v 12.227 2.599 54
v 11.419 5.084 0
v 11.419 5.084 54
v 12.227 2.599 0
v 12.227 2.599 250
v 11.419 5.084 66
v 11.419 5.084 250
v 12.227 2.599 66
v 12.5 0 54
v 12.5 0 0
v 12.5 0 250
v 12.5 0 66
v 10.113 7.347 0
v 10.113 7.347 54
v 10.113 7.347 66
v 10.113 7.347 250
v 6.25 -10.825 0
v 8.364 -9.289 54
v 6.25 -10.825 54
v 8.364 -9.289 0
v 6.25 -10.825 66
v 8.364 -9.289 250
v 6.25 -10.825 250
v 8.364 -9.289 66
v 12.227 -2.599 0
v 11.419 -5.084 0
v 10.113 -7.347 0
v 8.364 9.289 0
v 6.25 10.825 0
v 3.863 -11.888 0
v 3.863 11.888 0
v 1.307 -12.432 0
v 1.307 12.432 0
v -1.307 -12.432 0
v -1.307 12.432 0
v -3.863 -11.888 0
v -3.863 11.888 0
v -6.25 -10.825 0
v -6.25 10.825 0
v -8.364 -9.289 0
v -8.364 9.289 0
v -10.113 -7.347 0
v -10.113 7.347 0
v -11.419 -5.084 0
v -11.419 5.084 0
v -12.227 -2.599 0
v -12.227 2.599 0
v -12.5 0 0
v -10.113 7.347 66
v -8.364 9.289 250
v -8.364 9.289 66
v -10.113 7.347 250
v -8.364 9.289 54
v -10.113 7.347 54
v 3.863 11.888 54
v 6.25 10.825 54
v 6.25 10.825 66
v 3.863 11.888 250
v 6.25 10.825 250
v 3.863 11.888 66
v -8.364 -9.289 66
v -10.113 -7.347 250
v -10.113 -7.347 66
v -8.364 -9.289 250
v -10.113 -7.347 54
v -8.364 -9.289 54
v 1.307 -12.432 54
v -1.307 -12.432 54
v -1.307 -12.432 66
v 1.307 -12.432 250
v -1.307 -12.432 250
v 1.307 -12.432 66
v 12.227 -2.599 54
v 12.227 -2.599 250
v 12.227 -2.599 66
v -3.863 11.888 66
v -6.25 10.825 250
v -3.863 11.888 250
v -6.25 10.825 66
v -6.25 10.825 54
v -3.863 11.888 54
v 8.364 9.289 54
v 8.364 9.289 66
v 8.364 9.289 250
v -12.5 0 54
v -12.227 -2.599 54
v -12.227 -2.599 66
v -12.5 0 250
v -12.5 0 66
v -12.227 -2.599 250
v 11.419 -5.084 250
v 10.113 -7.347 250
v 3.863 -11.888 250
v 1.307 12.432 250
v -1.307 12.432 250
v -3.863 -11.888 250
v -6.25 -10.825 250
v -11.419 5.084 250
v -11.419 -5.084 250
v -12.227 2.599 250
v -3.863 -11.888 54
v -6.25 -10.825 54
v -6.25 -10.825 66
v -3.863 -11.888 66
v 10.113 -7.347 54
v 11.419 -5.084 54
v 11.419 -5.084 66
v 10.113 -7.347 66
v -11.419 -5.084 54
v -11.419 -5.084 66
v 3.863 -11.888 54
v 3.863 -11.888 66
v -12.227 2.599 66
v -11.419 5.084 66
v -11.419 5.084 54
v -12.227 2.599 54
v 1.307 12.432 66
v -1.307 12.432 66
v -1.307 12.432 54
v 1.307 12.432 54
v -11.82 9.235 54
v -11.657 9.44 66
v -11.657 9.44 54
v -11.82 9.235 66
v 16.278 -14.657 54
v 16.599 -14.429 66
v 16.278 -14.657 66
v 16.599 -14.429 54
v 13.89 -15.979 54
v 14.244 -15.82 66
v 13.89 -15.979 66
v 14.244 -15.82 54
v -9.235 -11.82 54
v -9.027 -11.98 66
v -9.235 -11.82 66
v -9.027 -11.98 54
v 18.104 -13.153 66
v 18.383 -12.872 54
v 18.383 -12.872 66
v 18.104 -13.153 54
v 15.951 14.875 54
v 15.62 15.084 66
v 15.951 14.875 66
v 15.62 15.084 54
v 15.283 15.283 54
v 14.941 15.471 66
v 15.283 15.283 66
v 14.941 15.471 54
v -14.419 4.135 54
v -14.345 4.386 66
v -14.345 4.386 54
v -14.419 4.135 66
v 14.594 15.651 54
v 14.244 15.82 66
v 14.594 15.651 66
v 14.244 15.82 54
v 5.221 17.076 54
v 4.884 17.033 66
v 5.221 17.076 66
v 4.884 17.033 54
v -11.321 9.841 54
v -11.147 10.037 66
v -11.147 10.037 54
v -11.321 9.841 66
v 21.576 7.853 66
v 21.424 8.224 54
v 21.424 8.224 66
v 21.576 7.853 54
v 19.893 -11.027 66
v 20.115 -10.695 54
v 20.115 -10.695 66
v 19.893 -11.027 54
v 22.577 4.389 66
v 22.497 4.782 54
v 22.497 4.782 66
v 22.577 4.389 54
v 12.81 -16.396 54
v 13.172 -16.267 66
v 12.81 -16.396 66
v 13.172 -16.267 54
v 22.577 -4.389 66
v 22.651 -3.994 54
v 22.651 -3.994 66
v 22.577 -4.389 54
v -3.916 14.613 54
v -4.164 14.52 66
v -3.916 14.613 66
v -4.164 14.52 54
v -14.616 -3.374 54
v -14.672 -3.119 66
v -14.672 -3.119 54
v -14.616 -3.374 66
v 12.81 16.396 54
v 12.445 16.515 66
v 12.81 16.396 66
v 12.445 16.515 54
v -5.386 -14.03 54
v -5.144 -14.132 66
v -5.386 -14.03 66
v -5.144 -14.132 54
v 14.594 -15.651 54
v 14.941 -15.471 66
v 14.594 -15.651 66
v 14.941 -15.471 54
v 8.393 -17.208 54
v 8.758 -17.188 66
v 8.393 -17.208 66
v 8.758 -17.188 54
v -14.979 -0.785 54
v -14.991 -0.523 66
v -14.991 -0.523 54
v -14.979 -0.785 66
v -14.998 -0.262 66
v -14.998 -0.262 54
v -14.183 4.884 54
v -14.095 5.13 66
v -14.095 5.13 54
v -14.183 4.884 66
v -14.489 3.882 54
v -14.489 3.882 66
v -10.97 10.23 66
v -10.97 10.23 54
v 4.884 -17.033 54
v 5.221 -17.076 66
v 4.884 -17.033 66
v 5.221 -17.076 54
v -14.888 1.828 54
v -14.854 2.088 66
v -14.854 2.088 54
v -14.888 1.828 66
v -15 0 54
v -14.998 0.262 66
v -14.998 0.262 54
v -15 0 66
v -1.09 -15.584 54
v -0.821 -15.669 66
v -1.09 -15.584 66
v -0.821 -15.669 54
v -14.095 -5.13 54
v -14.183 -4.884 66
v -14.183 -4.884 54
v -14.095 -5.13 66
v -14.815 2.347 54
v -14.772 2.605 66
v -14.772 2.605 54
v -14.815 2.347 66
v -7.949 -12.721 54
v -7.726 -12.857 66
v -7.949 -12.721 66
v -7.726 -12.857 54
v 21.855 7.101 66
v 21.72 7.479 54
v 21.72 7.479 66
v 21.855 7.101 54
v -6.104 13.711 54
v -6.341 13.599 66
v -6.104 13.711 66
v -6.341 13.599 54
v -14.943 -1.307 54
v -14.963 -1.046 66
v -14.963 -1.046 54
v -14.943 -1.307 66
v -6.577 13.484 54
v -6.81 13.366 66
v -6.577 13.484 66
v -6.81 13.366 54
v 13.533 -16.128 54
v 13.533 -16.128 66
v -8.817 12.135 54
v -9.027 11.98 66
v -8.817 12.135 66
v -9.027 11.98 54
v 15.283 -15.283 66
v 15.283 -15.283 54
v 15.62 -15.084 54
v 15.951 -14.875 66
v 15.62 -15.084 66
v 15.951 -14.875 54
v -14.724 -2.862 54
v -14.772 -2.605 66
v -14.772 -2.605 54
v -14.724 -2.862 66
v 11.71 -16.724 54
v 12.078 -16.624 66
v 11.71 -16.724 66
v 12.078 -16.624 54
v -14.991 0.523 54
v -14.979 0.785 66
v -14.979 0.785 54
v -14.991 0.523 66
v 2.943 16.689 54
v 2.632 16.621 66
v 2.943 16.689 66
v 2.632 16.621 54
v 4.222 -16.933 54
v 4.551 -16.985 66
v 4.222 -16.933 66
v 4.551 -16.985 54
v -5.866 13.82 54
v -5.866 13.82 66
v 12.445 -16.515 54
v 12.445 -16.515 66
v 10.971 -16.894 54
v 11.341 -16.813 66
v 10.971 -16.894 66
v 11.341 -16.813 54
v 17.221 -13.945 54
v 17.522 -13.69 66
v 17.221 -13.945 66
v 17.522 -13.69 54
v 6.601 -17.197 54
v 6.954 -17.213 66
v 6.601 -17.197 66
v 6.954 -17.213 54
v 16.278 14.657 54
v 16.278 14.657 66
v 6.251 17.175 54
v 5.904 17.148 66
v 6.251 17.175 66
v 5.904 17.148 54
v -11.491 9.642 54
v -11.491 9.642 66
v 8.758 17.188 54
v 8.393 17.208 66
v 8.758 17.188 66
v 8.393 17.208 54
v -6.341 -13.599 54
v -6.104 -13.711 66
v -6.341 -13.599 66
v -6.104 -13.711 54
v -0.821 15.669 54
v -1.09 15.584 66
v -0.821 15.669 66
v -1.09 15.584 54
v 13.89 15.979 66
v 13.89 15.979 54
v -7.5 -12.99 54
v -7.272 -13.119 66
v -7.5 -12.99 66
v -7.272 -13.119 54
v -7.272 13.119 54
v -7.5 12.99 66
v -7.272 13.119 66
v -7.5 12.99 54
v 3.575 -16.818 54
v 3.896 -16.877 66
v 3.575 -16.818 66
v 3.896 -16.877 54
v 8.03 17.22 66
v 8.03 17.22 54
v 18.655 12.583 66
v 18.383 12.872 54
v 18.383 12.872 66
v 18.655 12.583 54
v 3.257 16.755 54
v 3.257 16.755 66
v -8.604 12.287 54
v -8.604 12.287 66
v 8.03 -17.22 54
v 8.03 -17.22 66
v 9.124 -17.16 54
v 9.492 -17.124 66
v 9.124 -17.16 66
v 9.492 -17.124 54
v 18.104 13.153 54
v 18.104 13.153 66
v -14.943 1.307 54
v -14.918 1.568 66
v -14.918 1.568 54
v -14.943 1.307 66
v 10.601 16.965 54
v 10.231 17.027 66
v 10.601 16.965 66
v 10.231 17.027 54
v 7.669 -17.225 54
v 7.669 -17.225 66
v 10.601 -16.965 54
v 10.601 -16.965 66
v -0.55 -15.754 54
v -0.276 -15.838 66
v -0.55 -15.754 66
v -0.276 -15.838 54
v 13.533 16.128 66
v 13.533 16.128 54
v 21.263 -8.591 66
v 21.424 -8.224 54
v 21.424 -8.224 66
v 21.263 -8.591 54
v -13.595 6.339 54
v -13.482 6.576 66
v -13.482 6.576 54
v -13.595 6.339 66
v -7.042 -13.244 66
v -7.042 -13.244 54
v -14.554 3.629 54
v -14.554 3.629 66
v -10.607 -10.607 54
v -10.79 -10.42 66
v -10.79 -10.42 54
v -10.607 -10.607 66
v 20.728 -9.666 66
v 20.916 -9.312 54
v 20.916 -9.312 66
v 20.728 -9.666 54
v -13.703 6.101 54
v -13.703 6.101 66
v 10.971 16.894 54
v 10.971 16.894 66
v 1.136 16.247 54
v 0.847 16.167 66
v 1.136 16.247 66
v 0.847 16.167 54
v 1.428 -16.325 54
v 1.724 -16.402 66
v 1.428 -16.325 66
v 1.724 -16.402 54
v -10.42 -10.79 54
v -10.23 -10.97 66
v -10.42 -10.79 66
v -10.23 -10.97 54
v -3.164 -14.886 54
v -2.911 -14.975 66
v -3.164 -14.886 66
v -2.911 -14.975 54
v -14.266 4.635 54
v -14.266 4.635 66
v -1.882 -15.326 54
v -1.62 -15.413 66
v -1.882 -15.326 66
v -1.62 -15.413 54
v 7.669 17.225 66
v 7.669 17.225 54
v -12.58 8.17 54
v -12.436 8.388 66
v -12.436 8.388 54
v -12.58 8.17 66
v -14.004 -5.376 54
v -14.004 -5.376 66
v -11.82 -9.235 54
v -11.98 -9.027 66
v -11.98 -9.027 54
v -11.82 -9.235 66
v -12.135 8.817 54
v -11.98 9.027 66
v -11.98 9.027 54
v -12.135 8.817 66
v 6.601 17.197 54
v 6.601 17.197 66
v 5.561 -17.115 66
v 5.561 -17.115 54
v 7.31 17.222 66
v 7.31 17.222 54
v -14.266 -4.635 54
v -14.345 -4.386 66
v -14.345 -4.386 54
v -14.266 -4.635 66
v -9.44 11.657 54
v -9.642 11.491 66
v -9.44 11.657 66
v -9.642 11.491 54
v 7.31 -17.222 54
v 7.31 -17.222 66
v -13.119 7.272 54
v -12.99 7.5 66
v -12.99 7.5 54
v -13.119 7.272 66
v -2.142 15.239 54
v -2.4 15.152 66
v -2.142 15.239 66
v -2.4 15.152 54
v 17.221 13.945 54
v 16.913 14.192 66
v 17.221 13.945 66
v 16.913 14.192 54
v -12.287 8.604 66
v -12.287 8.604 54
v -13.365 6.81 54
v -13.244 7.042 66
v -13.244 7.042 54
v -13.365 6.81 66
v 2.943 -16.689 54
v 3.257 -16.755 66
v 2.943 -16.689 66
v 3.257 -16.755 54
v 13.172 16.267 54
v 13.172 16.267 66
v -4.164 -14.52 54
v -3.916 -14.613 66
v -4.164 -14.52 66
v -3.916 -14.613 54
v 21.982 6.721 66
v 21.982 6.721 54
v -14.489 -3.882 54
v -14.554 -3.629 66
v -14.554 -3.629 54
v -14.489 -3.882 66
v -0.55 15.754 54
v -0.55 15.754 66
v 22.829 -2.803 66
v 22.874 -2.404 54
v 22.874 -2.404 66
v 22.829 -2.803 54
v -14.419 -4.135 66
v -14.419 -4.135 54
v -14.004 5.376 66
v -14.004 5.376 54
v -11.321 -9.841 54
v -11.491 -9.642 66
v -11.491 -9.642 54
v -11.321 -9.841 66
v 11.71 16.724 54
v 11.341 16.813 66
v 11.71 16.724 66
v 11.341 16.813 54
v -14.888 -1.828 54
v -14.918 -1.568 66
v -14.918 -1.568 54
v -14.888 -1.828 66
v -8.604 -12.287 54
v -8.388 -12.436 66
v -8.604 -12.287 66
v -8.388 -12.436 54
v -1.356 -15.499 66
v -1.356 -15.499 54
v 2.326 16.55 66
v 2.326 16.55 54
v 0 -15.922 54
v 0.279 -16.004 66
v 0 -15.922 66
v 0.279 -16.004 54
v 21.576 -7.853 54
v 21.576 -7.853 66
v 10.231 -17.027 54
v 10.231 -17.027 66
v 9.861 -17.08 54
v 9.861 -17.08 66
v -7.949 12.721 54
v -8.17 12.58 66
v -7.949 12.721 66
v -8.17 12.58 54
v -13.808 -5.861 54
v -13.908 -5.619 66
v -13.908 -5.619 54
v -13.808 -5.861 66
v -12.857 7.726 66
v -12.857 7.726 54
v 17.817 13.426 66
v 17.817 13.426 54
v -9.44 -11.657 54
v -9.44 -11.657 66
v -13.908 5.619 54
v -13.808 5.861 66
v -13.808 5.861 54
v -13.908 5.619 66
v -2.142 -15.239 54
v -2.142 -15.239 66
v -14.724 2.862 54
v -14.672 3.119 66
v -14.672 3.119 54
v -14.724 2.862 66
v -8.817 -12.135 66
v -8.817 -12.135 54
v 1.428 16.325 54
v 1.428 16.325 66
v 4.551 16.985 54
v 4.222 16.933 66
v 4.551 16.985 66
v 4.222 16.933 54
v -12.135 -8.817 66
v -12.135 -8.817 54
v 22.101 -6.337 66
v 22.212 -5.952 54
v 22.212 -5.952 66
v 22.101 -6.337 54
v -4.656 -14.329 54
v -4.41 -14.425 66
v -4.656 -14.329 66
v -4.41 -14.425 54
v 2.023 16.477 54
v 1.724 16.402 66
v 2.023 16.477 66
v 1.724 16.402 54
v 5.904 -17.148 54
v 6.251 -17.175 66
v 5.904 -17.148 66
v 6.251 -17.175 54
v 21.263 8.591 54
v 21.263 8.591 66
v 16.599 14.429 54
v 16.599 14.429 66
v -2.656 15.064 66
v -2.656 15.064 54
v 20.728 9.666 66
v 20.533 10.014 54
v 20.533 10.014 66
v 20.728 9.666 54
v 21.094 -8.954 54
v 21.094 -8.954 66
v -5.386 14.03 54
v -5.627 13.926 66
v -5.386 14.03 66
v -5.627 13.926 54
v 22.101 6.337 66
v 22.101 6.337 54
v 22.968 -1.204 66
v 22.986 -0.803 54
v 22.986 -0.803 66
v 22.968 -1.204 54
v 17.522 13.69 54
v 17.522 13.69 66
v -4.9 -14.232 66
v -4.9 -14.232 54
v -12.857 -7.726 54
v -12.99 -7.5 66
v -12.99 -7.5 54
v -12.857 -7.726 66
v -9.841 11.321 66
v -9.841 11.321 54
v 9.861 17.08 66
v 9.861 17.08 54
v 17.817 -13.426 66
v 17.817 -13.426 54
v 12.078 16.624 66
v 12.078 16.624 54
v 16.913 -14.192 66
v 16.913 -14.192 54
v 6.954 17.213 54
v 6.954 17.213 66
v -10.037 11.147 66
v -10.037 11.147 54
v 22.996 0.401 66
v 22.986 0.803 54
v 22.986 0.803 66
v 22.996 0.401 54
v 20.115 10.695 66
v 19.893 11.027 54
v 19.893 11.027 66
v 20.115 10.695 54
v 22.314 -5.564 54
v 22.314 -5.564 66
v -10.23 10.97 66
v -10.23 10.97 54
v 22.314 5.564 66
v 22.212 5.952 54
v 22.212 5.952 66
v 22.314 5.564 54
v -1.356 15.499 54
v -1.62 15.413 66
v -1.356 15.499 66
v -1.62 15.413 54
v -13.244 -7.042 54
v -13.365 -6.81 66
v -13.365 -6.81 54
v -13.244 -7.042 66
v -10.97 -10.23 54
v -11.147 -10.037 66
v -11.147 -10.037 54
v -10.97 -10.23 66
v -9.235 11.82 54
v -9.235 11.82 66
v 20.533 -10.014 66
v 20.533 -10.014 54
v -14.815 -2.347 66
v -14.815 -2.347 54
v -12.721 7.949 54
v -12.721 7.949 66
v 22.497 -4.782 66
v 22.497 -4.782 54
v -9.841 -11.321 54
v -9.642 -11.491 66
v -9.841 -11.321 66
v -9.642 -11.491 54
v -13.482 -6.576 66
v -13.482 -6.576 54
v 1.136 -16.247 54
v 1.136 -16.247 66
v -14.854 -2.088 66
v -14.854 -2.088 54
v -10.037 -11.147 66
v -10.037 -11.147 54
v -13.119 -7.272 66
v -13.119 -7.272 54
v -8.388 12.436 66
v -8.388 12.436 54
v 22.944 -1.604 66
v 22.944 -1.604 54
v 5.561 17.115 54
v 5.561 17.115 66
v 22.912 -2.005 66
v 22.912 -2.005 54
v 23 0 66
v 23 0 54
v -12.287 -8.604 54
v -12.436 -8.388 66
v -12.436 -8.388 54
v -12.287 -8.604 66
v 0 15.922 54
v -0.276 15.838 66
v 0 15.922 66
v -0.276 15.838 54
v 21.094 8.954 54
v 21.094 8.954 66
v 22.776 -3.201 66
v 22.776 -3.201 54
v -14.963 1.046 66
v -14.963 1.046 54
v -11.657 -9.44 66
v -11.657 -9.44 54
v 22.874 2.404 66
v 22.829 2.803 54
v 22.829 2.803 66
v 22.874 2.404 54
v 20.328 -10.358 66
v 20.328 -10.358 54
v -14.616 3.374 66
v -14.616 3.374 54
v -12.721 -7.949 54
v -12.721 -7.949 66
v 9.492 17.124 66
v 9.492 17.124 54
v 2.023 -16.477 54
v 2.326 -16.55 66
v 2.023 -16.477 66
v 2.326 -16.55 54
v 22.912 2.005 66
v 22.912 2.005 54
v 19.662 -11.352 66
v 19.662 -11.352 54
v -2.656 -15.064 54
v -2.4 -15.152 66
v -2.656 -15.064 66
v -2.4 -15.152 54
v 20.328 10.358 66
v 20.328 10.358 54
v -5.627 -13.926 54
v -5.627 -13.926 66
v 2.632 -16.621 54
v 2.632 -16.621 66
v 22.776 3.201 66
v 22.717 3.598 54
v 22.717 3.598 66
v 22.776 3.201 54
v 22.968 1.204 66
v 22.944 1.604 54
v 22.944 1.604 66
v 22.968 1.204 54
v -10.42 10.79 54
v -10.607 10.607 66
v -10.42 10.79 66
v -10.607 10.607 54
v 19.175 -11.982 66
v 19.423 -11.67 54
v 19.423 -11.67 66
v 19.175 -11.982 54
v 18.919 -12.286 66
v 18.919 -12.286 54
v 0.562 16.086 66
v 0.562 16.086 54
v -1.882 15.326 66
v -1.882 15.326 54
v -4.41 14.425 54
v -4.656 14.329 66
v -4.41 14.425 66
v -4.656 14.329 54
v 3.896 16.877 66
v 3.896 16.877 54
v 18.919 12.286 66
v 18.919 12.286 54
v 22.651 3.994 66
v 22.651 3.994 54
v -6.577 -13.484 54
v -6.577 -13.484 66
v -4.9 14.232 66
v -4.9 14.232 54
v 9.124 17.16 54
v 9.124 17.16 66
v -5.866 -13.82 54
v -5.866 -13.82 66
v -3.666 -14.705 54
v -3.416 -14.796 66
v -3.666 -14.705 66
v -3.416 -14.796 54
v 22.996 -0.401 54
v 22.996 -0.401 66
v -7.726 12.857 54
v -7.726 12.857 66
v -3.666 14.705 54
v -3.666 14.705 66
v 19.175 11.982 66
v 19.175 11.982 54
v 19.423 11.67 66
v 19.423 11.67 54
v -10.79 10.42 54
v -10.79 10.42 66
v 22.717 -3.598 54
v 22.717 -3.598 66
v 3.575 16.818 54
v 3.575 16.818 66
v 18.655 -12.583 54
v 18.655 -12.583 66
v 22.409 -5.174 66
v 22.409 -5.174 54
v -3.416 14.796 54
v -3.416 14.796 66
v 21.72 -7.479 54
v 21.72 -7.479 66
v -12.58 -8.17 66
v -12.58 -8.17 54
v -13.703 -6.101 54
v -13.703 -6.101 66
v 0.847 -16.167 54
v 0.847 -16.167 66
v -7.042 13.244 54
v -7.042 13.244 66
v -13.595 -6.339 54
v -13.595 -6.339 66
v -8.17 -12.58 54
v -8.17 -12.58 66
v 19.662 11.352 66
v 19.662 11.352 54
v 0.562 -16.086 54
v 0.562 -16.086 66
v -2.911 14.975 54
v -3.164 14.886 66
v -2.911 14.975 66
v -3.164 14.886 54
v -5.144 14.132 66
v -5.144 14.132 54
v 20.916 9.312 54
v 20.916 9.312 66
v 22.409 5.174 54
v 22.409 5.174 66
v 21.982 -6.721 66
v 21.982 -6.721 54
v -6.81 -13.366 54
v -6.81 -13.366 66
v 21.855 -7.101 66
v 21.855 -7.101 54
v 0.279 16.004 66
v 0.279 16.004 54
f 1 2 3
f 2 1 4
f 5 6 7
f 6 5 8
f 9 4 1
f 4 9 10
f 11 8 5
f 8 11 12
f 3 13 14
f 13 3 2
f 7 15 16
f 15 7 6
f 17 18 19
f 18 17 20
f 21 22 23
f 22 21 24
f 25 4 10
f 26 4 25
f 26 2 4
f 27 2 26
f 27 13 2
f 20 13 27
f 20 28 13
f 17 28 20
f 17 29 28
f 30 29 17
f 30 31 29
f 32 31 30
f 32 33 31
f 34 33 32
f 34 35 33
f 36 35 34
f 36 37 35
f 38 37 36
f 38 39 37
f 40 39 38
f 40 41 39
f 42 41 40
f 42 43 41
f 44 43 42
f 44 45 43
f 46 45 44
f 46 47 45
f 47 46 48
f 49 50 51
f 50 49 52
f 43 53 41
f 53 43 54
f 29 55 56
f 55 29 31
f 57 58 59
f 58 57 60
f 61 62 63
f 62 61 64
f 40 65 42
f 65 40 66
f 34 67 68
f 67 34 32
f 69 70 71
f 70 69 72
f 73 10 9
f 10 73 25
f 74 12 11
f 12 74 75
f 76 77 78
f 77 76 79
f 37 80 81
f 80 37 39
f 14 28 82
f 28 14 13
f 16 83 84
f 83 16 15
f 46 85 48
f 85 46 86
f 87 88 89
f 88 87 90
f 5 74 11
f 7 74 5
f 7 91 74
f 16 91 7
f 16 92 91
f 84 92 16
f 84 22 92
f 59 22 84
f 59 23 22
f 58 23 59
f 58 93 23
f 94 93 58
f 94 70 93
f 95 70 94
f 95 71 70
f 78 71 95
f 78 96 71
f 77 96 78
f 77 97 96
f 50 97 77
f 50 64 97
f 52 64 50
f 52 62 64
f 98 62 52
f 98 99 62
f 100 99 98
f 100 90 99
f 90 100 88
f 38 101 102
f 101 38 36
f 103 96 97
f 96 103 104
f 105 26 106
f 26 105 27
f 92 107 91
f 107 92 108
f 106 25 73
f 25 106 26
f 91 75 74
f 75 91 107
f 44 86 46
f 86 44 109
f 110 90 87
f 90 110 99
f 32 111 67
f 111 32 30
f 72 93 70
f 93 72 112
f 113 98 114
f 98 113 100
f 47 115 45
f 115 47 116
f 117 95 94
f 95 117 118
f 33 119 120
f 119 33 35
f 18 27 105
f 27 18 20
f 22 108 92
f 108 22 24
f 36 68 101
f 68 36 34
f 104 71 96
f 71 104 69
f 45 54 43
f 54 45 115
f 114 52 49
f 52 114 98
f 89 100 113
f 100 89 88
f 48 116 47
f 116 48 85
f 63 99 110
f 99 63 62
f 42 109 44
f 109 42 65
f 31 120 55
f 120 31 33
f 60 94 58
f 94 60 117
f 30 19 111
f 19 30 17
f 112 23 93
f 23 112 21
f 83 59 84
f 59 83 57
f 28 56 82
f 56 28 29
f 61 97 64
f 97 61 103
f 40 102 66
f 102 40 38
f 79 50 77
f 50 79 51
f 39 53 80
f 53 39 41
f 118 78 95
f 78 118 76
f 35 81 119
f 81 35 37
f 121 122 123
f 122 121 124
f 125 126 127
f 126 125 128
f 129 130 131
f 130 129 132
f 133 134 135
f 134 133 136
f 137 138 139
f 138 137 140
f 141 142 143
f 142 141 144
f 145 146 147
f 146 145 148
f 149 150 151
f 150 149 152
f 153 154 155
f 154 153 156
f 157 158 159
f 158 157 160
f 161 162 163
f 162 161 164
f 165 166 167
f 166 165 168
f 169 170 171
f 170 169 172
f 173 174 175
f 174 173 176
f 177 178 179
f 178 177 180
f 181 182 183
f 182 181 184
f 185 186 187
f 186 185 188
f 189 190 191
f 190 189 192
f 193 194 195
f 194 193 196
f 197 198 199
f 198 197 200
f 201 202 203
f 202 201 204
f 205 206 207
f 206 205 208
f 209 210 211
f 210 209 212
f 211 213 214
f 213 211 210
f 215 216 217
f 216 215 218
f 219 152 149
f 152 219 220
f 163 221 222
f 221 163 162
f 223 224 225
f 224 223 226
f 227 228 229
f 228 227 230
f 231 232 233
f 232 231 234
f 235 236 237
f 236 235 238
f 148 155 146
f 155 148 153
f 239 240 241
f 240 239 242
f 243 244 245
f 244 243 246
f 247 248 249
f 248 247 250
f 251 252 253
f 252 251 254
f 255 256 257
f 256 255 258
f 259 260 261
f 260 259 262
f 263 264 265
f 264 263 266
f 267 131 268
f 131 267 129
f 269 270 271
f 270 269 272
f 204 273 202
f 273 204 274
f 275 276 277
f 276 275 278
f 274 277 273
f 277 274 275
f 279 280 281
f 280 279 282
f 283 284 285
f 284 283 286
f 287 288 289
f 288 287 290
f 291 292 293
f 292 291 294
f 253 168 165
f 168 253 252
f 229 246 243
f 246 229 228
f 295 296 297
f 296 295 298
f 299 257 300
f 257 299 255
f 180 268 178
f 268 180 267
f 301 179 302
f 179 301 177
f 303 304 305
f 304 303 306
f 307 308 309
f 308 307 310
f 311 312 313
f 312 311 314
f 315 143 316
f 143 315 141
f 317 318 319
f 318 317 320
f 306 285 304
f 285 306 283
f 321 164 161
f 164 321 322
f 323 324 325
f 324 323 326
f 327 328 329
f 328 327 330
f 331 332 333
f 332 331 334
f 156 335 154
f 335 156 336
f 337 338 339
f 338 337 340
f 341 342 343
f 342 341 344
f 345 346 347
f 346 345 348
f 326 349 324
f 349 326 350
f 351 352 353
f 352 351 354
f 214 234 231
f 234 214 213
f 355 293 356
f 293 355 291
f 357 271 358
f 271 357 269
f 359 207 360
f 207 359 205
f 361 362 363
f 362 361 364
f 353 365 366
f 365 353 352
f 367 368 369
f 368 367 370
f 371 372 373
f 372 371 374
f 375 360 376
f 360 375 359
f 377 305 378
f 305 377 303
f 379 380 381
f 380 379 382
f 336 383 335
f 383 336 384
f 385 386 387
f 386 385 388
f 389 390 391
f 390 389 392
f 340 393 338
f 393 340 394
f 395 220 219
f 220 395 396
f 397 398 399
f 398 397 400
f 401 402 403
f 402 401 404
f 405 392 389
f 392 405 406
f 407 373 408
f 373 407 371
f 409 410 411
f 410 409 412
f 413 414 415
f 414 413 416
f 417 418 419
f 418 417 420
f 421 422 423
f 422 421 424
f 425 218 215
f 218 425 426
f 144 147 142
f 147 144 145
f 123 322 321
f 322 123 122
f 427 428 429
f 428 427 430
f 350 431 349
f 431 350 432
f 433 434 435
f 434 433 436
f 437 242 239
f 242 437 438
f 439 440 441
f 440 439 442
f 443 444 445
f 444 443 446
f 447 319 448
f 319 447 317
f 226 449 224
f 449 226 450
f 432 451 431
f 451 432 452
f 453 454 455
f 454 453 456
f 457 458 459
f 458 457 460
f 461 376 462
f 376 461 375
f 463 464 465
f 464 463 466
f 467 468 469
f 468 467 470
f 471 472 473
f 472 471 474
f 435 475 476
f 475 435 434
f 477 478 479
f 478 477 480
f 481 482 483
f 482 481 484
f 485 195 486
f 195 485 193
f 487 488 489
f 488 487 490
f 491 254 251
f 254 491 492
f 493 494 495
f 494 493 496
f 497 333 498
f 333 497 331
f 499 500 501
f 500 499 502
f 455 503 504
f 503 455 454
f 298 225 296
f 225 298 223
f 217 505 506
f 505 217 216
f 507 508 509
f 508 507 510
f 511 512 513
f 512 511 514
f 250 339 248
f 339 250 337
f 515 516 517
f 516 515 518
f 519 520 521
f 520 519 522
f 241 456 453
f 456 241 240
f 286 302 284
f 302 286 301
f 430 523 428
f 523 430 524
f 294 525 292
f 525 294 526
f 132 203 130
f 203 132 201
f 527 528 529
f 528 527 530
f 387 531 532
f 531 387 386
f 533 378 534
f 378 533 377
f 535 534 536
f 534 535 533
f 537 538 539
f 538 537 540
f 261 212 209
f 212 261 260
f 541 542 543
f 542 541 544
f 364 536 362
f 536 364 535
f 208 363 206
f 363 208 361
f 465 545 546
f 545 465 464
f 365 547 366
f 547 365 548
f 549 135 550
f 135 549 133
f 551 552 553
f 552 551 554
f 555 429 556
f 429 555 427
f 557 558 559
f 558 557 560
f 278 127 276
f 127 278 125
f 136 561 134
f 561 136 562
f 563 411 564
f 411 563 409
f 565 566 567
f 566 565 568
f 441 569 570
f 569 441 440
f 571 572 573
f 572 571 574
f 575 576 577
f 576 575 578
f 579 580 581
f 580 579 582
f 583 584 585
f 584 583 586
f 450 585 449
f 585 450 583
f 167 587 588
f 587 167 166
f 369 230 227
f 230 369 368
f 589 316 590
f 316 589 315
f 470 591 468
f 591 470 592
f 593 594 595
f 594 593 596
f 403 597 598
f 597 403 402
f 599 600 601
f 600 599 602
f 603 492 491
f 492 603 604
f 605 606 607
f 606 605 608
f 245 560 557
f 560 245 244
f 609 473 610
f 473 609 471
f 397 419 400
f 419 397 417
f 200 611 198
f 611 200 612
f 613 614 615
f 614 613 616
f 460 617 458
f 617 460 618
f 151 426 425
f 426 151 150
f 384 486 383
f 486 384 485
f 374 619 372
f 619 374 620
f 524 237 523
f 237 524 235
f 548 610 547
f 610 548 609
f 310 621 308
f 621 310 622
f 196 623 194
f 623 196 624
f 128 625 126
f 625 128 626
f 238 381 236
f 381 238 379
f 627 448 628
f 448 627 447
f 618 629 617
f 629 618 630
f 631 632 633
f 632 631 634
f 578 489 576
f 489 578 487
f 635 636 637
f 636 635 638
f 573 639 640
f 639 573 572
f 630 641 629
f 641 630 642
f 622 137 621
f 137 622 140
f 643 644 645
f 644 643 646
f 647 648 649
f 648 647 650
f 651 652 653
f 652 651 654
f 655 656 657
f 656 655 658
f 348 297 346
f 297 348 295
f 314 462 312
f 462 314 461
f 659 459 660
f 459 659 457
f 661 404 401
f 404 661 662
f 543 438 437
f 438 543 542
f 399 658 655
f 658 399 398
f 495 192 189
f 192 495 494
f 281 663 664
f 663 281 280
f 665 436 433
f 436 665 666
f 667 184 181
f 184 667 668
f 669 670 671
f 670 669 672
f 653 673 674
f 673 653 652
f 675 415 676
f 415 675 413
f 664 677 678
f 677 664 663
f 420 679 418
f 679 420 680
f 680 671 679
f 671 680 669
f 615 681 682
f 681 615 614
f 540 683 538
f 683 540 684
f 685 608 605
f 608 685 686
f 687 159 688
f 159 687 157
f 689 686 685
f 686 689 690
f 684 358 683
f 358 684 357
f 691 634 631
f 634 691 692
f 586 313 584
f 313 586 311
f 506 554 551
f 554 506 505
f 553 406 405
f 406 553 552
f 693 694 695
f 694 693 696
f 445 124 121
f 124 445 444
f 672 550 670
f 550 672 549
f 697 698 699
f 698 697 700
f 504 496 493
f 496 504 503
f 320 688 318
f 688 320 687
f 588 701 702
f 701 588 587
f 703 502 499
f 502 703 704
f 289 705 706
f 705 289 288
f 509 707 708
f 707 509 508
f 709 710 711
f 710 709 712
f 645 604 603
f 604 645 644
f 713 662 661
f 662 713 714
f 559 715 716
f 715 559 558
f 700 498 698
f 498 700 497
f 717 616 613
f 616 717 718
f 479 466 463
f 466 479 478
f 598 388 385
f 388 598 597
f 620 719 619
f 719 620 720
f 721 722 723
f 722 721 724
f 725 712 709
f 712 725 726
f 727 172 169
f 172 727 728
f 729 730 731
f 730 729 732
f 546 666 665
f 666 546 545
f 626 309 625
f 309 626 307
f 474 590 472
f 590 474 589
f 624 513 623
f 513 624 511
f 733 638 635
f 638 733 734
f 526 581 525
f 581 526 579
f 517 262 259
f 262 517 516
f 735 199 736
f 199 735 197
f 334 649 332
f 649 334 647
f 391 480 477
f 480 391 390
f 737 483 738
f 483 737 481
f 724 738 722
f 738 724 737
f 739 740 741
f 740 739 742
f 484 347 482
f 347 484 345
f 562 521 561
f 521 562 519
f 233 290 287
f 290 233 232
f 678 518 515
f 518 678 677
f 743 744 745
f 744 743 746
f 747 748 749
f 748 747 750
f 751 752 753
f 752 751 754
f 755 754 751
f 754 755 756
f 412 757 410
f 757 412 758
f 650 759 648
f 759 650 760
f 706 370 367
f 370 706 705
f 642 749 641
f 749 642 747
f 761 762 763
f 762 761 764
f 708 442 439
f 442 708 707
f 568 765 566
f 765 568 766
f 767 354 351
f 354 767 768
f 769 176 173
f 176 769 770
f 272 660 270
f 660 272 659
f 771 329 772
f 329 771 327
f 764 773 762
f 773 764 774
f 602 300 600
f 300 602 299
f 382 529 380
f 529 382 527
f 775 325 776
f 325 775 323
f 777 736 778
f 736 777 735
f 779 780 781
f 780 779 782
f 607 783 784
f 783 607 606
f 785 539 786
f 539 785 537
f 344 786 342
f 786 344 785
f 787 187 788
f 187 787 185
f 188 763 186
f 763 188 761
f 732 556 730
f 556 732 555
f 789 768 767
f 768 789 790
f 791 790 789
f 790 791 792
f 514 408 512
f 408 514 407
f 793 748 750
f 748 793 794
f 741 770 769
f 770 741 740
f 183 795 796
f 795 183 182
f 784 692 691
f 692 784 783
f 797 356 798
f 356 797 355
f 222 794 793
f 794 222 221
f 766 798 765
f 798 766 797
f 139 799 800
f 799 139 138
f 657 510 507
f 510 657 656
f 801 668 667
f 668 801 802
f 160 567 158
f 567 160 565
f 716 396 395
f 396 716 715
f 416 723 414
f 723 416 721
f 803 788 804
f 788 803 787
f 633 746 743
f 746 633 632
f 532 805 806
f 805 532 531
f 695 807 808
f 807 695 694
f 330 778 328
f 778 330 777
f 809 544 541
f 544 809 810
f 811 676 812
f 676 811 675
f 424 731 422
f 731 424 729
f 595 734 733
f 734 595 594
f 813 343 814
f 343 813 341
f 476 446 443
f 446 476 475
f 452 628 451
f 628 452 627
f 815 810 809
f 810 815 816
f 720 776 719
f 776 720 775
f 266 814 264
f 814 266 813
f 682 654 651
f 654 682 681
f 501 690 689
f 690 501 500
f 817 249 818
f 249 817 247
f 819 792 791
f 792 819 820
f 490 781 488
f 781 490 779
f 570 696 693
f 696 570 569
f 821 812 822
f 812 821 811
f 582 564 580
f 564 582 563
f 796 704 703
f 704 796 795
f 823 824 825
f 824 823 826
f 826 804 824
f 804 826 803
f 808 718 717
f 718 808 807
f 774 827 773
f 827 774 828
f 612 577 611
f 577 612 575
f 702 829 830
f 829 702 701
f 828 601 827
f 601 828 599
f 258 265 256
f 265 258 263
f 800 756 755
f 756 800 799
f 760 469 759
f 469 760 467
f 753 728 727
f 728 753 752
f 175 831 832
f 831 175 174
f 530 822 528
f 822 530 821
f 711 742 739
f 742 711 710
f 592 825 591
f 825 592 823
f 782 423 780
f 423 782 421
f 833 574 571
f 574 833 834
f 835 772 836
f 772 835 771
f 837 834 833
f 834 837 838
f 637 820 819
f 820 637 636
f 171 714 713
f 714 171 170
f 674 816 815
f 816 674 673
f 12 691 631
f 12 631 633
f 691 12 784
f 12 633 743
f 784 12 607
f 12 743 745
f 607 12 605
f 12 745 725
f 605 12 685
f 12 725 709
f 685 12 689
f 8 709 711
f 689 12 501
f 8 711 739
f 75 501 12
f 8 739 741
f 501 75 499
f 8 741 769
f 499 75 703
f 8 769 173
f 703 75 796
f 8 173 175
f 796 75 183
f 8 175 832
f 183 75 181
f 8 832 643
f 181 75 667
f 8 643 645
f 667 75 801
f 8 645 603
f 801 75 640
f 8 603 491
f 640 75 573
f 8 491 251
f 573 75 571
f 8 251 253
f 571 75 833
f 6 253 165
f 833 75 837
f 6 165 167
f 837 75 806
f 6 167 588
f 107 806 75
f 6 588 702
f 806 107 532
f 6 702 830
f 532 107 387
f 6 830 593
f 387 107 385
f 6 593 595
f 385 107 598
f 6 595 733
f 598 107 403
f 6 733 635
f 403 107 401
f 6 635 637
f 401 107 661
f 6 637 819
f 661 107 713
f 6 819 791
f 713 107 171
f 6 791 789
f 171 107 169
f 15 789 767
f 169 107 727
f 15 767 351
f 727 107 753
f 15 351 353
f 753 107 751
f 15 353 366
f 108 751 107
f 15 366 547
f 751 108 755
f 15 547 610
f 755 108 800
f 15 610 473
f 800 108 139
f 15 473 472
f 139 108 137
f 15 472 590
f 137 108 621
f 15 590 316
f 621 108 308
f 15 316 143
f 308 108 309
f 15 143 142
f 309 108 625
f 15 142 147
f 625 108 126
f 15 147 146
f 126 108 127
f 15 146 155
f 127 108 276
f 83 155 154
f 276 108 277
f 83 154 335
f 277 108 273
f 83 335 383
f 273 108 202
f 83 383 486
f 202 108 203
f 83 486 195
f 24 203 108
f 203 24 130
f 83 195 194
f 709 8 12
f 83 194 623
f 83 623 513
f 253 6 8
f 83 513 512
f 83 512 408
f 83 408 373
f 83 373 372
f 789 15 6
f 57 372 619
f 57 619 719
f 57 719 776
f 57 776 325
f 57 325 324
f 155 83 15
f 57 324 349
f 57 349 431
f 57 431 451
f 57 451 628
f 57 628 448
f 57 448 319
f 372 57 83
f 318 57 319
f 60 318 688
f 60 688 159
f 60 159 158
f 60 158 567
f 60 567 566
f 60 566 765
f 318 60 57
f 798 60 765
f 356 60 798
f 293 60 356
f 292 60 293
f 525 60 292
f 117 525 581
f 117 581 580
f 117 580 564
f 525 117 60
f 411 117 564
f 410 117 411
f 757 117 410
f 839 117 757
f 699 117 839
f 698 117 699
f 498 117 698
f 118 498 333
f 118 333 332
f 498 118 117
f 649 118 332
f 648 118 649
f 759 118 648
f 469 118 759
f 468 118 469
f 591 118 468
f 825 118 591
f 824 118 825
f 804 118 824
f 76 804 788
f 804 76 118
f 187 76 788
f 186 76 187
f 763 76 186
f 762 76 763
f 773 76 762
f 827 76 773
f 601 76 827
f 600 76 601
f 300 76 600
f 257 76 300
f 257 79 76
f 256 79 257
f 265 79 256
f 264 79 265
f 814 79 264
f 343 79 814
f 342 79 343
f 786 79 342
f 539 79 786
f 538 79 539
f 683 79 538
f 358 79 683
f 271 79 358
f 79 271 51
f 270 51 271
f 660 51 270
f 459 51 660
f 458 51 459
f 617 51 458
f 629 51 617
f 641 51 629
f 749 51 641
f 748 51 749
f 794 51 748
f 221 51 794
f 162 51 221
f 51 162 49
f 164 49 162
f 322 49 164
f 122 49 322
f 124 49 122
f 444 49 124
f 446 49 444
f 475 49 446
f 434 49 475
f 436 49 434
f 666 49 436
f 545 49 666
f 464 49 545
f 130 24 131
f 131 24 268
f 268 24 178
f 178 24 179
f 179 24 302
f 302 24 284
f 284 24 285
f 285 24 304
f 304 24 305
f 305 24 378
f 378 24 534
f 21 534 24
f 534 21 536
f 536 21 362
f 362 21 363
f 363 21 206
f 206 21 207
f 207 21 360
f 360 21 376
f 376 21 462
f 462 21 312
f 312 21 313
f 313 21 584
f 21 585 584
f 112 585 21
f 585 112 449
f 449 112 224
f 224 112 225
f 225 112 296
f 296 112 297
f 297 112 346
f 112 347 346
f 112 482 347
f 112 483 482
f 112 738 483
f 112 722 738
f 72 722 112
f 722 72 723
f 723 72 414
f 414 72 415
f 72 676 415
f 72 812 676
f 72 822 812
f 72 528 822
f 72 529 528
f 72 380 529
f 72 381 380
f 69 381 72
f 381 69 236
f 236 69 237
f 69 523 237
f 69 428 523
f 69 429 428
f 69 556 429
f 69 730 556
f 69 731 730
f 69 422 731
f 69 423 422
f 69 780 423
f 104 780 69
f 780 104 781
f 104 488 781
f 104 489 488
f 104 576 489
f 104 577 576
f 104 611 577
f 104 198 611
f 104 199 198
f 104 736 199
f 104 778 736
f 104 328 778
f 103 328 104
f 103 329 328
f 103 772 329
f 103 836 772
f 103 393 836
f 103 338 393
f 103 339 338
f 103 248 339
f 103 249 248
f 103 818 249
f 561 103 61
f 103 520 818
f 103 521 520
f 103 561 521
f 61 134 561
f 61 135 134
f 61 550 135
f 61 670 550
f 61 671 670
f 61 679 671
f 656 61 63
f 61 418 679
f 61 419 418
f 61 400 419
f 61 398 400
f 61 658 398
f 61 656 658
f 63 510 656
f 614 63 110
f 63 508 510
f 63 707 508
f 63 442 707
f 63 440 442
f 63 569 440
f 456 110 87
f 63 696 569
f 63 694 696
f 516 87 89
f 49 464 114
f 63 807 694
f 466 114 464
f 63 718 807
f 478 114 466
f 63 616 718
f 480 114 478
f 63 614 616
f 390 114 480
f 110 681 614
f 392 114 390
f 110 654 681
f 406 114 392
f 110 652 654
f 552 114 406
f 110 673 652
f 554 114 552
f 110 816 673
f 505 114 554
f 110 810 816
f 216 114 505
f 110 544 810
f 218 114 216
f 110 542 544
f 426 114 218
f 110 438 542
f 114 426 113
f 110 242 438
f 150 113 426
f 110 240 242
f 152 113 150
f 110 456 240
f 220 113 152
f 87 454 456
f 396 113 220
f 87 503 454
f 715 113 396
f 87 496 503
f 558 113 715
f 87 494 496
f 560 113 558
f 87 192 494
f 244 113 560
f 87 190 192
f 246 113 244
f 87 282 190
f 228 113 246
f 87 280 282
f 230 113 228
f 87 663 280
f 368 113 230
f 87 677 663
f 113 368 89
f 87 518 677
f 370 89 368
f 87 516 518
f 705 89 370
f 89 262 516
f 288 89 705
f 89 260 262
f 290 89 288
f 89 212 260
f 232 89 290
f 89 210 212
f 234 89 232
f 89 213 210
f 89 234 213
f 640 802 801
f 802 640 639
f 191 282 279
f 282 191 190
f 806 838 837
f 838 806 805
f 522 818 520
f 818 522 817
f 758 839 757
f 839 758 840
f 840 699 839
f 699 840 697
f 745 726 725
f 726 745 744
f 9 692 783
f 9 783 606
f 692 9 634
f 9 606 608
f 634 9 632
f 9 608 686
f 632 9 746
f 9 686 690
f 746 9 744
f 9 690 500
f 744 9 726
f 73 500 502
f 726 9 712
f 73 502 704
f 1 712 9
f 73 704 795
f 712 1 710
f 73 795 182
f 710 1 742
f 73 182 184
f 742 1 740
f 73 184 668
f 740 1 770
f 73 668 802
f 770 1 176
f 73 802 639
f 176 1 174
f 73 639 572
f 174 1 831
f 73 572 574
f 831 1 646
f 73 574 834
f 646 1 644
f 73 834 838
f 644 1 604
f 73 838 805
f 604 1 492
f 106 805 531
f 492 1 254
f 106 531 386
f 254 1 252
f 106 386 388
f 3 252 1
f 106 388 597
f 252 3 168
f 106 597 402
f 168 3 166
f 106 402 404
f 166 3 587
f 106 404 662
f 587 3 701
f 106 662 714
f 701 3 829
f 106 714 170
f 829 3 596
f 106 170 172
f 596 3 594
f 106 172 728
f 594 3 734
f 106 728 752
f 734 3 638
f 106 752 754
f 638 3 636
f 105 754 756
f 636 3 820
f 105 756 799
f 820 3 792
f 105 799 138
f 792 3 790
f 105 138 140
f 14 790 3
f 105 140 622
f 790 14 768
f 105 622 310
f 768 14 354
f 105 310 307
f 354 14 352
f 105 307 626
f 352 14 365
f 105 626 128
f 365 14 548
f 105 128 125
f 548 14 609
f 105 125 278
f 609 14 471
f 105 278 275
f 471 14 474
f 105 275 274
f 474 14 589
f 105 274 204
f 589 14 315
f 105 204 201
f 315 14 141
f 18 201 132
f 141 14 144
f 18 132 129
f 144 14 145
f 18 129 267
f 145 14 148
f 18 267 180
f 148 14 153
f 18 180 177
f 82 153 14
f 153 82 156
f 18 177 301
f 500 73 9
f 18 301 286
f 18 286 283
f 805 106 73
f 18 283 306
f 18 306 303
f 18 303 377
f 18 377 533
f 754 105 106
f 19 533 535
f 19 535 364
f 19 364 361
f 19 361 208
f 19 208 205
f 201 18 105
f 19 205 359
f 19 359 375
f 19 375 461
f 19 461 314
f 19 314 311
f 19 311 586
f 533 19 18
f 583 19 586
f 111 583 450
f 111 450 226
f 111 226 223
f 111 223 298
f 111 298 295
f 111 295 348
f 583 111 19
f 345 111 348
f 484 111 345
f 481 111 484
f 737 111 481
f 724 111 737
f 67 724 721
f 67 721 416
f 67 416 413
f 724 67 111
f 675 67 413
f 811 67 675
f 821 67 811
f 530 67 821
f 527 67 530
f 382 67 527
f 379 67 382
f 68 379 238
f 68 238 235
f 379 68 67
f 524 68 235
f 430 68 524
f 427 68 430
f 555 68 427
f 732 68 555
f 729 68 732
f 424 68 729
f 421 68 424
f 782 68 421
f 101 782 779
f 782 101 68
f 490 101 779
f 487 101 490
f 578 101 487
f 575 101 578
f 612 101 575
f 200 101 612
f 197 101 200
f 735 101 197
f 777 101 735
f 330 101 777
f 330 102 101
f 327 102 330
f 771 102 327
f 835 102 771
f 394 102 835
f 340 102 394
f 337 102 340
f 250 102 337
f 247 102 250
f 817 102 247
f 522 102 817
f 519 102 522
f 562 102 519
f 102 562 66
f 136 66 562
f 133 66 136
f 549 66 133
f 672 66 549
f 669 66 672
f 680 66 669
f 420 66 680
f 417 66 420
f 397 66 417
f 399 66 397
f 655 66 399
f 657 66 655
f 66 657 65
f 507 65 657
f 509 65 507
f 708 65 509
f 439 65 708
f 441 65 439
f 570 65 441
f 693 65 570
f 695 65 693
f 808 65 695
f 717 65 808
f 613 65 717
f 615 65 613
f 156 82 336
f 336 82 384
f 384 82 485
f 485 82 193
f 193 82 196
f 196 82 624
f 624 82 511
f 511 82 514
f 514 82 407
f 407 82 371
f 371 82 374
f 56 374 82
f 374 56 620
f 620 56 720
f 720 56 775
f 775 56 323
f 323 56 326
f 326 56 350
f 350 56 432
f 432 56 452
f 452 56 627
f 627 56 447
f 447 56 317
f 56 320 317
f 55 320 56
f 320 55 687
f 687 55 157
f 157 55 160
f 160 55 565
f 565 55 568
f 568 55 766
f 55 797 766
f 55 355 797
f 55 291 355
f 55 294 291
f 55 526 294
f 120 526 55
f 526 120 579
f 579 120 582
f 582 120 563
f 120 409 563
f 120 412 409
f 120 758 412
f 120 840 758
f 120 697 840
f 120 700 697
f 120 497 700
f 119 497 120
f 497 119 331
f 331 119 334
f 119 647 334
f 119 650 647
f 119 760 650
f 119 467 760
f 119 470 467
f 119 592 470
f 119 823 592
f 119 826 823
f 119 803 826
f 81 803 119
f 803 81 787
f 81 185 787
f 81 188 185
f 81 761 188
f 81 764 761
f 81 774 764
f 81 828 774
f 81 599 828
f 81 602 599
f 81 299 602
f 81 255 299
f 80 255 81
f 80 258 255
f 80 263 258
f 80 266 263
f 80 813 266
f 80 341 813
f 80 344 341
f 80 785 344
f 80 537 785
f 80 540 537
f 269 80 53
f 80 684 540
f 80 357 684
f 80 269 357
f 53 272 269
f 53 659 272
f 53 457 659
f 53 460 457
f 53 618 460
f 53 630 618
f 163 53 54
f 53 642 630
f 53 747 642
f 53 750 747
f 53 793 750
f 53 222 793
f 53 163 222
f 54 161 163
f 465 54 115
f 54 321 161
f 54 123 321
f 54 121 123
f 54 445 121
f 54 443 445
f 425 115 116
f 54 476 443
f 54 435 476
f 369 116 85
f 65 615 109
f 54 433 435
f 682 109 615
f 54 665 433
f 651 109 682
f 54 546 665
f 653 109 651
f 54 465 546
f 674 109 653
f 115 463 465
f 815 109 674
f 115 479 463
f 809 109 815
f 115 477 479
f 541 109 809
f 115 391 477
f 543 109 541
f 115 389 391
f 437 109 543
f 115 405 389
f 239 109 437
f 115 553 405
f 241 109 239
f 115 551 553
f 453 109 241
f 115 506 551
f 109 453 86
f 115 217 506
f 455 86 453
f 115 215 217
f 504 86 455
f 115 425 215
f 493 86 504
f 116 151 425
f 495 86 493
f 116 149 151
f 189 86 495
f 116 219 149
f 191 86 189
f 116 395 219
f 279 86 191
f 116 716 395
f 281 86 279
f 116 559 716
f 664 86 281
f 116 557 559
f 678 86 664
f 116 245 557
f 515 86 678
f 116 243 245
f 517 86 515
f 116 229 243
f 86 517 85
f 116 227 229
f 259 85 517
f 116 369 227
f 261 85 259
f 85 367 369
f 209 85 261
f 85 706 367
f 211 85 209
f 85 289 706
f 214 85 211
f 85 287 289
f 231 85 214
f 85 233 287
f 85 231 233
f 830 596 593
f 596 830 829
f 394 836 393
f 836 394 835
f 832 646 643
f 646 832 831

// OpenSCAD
// Generado con OpenSCAD GUI Mejorada

// Árbol de levas, fase 1: eje y un lóbulo.
//
// Cada pieza es una llamada con sus medidas, y su definición va al final del archivo:
//   camshaft_main_shaft(length, d)  eje a lo largo de Z, de z = 0 a z = length.
//   cam_lobe(...)                   lóbulo centrado en z = position, con la punta hacia angle grados.
// Para cambiar las medidas desde otro programa, basta con reescribir los números de estas llamadas
// (por ejemplo "position = 60") y abrir o renderizar el archivo: no hace falta tocar los módulos.
// Para añadir un lóbulo, copie la línea de cam_lobe y cambie position y angle.
camshaft_main_shaft(length = 250, d = 25);
cam_lobe(base_r = 15, lift = 8, width = 12, rise_angle = 110, dwell_angle = 20, fall_angle = 110, motion = "cicloidal", angle = 0, position = 60, step = 1);

module camshaft_main_shaft(length = 250, d = 25) {
  // Main shaft of a camshaft (written by OpenSCAD GUI Mejorada): a plain cylinder along Z,
  // from z = 0 to z = length. The lobes (cam_lobe) are placed on it by their own position.
  cylinder(h = length, d = d);
}

module cam_lobe(base_r = 15, lift = 8, width = 12, rise_angle = 110, dwell_angle = 20, fall_angle = 110,
                motion = "cicloidal", angle = 0, position = 20, step = 1) {
  // Camshaft lobe (written by OpenSCAD GUI Mejorada).
  // The profile is the base radius plus the lift given by the motion law: it rises over
  // rise_angle, stays at full lift for dwell_angle centred on the nose, falls over fall_angle
  // and the rest of the turn stays on the base circle. The nose points at angle degrees, and
  // rise and fall may differ (asymmetric lobe). Same 4 laws as the plate cam ("Cams and Cam
  // Design", Machinery's Handbook 27, pp. 2190-2192), normalized to lift 1 and angle 1.
  // Extruded along Z (the camshaft axis), centred on z = position; step is degrees per point.
  rise = max(0, rise_angle); dwell = max(0, dwell_angle); fall = max(0, fall_angle);
  rest = max(0, 360 - rise - dwell - fall);
  s = max(0.1, step);
  function mot(t) = motion == "velocidad_constante" ? t :
                     motion == "parabolica" ? (t <= 0.5 ? 2 * t * t : 1 - 2 * (1 - t) * (1 - t)) :
                     motion == "armonica" ? 0.5 * (1 - cos(180 * t)) :
                     t - sin(360 * t) / (2 * PI);                              // cycloidal (default)
  // Polar points of one stretch: it starts at angle a0, spans span degrees, radius r(f) for f in [0, 1).
  function stretch(a0, span, kind) = span <= 0 ? [] :
    let(n = max(1, ceil(span / s)))
    [for (i = [0 : n - 1]) let(f = i / n,
       r = base_r + lift * (kind == 0 ? mot(f) : kind == 1 ? 1 : kind == 2 ? 1 - mot(f) : 0),
       a = a0 + span * f) [r * cos(a), r * sin(a)]];
  a0 = angle - rise - dwell / 2;
  profile = concat(stretch(a0, rise, 0), stretch(a0 + rise, dwell, 1),
                   stretch(a0 + rise + dwell, fall, 2), stretch(a0 + rise + dwell + fall, rest, 3));
  translate([0, 0, position - width / 2]) linear_extrude(width) polygon(profile);
}
